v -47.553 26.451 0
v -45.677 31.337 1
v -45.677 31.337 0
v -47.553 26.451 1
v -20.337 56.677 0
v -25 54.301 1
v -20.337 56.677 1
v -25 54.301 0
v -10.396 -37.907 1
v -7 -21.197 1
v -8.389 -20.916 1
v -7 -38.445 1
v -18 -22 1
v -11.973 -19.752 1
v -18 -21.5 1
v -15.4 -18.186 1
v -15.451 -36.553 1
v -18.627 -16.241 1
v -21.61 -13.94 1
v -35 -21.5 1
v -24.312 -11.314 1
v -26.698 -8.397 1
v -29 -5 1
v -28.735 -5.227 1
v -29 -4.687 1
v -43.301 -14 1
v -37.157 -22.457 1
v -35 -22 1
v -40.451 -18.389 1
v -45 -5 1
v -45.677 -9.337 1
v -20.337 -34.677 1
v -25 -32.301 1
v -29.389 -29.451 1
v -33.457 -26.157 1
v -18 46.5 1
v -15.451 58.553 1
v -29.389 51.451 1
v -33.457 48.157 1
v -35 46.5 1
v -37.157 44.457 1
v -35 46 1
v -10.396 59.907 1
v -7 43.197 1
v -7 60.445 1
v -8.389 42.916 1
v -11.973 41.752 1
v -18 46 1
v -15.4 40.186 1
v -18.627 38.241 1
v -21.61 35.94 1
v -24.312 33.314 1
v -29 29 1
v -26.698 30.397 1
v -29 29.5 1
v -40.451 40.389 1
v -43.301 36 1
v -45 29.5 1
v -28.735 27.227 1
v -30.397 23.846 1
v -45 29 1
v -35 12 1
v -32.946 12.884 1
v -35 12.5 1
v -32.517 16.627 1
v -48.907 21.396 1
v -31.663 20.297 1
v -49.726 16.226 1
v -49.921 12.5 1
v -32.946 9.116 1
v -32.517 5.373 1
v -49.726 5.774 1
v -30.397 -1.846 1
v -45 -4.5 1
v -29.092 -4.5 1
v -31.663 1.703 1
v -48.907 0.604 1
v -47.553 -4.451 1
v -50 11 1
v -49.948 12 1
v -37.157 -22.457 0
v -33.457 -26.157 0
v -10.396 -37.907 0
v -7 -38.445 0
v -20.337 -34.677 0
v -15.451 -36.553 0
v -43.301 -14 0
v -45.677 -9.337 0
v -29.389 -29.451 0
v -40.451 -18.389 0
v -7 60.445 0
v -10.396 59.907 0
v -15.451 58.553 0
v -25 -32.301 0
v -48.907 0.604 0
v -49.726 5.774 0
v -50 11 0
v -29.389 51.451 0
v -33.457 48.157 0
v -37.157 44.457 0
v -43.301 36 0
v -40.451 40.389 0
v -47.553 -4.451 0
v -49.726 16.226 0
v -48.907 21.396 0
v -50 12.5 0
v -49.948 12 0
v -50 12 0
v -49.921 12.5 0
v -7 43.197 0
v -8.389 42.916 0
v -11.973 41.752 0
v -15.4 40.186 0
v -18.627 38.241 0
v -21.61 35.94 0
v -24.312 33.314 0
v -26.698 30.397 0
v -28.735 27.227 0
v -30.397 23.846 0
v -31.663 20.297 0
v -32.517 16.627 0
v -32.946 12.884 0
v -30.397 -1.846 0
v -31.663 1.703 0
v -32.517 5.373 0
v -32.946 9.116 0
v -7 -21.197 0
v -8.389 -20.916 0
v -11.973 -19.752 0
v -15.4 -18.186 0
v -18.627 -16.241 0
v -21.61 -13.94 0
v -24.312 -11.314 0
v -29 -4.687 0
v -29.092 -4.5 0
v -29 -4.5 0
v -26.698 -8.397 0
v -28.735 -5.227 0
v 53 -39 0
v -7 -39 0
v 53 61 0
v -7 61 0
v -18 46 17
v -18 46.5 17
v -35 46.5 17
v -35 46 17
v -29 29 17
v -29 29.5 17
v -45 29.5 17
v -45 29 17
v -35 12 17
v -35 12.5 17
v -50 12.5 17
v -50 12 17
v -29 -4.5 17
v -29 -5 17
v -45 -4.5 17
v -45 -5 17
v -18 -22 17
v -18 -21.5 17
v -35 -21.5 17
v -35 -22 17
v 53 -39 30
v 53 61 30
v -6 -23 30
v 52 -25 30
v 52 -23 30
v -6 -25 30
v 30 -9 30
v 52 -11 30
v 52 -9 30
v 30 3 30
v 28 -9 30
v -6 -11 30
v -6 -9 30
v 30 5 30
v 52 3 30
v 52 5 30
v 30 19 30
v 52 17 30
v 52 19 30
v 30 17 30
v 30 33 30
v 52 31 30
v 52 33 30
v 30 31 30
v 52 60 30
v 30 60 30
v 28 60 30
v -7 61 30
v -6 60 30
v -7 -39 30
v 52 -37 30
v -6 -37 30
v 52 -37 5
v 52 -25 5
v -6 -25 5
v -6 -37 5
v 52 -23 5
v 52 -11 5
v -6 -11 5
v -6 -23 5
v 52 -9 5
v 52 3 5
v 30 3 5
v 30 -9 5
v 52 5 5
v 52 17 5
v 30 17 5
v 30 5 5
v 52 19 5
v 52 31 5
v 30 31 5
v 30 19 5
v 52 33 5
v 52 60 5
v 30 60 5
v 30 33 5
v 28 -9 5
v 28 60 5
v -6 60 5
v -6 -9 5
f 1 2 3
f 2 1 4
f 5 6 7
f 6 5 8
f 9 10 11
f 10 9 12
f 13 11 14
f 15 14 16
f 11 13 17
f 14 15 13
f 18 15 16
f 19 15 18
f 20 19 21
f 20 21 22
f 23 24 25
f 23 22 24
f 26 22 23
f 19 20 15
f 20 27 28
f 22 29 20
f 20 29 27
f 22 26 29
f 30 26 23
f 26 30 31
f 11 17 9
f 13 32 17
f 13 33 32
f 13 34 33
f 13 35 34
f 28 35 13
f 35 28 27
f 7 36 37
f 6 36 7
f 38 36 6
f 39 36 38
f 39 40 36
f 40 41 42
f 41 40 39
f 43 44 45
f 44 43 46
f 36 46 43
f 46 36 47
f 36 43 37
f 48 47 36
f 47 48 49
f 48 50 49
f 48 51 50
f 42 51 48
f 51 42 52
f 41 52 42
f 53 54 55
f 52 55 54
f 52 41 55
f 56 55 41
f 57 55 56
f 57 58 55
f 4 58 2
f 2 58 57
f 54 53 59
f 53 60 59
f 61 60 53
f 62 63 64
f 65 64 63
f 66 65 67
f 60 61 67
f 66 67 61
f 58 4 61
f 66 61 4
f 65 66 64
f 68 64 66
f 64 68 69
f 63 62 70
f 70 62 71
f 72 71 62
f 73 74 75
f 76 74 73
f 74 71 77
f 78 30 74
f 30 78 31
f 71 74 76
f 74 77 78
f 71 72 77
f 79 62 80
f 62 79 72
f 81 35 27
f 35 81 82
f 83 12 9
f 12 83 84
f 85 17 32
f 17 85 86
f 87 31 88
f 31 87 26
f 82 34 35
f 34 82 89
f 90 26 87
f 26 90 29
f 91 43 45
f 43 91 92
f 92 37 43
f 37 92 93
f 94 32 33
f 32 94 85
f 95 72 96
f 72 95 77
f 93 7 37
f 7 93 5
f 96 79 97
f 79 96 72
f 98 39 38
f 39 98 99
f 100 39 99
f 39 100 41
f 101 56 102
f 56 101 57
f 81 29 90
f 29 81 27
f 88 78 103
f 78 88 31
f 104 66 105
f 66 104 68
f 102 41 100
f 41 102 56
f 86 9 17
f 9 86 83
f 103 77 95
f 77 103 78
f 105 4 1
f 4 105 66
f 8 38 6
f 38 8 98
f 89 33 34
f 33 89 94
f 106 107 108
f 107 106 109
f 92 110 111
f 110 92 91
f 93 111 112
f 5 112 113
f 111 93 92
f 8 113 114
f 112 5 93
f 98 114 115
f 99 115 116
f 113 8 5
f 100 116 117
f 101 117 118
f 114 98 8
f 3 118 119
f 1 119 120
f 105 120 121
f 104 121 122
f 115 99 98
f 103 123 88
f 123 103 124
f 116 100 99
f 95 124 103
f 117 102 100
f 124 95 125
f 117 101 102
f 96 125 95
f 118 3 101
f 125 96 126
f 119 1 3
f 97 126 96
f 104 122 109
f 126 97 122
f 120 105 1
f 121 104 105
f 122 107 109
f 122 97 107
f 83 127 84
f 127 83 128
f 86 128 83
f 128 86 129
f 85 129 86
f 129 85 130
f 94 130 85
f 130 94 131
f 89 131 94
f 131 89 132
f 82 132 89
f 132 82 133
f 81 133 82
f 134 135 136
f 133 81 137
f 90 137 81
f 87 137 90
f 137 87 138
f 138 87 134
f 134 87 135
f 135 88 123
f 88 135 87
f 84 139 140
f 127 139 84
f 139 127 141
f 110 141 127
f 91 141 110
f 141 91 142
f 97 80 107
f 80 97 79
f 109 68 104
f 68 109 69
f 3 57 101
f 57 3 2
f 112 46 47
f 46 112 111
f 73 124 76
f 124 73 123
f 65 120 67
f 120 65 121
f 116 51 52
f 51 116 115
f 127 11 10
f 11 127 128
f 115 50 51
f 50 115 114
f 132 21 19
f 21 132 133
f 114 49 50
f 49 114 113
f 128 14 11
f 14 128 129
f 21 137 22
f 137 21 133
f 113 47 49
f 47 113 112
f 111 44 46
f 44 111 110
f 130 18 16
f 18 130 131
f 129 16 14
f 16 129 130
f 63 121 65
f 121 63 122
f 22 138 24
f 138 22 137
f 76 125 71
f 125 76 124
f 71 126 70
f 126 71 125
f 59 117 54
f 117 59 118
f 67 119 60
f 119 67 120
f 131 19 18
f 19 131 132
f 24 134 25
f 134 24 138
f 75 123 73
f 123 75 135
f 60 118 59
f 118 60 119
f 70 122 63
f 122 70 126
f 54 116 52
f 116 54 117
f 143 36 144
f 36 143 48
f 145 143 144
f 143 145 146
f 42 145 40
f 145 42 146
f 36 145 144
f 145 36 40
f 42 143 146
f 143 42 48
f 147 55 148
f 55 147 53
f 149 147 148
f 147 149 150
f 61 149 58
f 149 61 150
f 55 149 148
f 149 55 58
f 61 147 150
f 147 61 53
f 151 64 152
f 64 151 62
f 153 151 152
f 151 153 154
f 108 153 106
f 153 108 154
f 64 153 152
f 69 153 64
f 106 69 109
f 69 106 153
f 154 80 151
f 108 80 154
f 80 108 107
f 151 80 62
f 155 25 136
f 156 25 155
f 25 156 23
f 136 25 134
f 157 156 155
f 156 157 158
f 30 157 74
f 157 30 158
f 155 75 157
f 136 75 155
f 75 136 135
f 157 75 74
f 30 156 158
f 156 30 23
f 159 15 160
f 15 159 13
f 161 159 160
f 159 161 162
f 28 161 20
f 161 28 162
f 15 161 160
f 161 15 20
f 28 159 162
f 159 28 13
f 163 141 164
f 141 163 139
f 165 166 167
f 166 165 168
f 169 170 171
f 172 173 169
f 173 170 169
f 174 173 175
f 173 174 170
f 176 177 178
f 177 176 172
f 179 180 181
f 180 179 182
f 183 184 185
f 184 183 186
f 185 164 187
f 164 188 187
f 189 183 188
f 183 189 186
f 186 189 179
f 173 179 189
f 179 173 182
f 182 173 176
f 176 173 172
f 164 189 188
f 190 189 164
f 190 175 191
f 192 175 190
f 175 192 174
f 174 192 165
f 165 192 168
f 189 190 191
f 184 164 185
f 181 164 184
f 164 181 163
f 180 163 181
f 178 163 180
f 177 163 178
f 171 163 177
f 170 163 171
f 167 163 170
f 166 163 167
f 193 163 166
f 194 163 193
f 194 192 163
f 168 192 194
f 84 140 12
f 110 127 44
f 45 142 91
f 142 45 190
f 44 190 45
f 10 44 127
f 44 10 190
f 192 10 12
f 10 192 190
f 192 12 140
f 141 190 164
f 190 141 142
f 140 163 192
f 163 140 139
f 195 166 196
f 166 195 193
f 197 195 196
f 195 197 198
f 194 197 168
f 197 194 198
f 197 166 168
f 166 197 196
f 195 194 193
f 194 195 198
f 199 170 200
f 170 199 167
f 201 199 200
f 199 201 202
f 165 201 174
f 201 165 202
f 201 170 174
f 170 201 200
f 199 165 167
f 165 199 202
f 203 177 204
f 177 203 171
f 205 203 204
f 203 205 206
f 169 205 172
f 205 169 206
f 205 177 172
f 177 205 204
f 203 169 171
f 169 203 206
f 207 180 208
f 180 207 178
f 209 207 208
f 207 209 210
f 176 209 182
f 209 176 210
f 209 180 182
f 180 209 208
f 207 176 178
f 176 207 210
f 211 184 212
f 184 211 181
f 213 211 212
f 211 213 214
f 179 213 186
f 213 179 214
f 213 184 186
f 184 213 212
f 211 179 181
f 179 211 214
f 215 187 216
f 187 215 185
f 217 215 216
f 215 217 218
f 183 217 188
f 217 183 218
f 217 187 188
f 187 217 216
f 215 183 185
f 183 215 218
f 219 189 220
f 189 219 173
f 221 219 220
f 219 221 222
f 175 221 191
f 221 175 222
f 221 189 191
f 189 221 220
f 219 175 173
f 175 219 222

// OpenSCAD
//import("/Users/cnandi/research/reincarnate/src/ocaml/phase2/infer/benchmarks/finalbenches/wardrobe/stunning_kieran-amberis.stl");

union() {

difference() {
    translate([0, 11, 0]) {
    scale([50, 50, 1])
    cylinder($fn = 60);
    }

    translate([0, 11, 0]) {
    scale([33, 33, 1])
    cylinder($fn = 55);
    }
}

union () {
    translate([-35, 46, 0]) {
    scale([17, 0.5, 17])
    cube();
    }

    translate([-45, 29, 0]) {
    scale([16, 0.5, 17])
    cube();
    }
    
    translate([-50, 12, 0]) {
    scale([15, 0.5, 17])
    cube();
    }
    
    translate([-45, -5, 0]) {
    scale([16, 0.5, 17])
    cube();
    }
    
    translate([-35, -22, 0]) {
    scale([17, 0.5, 17])
    cube();
    }   
}



difference() {

    translate([-7, -39, 0]) {
    scale([60, 100, 30])
    cube();
    }
   
    translate([-6, -37, 5]) {
    scale([58, 12, 30])
    cube();
    }
    
    translate([-6, -23, 5]) {
    scale([58, 12, 30])
    cube();
    }
    
    translate([30, -9, 5]) {
    scale([22, 12, 30])
    cube();
    }
    
    translate([30, 5, 5]) {
    scale([22, 12, 30])
    cube();
    }

    translate([30, 19, 5]) {
    scale([22, 12, 30])
    cube();
    }

    translate([30, 33, 5]) {
    scale([22, 27, 30])
    cube();
    }
 
    translate([-6, -9, 5]) {
    scale([34, 69, 50])
    cube();
    }  
}

}
